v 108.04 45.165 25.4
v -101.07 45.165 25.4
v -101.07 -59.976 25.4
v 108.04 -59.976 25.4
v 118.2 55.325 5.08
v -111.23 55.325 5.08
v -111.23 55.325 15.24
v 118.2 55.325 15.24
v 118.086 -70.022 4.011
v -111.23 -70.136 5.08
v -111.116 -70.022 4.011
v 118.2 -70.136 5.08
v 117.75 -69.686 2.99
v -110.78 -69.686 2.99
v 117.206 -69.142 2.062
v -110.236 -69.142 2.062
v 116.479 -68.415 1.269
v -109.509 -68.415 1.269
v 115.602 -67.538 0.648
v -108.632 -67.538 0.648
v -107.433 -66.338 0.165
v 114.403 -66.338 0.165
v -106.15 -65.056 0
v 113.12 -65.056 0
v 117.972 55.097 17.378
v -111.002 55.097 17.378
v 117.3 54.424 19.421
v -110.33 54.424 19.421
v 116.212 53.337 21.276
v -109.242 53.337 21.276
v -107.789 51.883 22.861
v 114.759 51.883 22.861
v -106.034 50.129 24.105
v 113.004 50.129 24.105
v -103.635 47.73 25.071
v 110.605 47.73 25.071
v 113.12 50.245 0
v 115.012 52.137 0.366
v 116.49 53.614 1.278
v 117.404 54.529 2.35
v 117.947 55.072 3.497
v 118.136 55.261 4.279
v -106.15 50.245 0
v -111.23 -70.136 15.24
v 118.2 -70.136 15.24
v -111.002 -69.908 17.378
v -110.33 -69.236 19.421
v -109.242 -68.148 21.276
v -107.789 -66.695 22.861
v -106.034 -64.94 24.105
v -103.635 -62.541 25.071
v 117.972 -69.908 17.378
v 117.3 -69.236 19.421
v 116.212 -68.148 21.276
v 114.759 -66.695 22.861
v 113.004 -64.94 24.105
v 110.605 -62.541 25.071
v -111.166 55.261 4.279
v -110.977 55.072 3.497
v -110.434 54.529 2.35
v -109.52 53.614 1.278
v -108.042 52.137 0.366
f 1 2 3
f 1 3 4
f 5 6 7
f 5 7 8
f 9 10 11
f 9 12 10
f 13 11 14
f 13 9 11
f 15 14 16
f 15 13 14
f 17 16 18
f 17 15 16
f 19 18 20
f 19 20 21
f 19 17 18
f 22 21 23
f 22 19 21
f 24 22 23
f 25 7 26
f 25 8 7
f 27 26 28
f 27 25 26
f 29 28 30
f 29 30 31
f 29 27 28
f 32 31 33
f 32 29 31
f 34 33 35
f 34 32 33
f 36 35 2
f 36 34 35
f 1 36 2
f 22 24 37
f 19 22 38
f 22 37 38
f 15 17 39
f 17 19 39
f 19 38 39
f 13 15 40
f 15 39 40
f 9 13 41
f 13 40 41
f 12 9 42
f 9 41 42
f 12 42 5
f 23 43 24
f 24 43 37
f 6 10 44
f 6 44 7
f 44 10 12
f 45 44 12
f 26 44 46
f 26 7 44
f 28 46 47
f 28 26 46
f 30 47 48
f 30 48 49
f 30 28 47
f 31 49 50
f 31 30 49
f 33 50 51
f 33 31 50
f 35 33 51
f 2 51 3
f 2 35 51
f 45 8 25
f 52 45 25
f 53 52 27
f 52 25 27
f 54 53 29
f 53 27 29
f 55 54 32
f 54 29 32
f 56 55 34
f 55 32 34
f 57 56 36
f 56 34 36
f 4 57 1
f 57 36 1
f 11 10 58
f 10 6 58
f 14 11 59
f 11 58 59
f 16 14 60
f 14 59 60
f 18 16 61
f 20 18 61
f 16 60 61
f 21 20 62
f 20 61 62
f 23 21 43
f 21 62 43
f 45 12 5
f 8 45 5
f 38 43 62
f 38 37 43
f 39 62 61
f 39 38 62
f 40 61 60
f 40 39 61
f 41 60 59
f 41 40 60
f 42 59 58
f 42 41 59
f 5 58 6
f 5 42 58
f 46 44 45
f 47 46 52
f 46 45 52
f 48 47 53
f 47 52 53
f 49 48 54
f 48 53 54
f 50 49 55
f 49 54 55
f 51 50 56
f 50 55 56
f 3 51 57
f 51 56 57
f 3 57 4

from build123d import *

# Parameters (mm, degrees)
F0_W     = 229.429774
F0_H     = 125.460326
F1_DEPTH = 25.4
F2_R     = 10.16
F3_R     = 5.08


with BuildPart() as f1:
    # F0 (on Top) → F1 (new body)
    with BuildSketch(Plane.XY):
        with Locations((3.485013, -7.405646)):
            Rectangle(F0_W, F0_H)
    extrude(amount=F1_DEPTH)

    # F2
    f2_edges = [f1.edges().sort_by_distance(p)[0] for p in [
        (3.485013, 55.324517, 25.4),
        (-111.229874, -7.405646, 25.4),
        (3.485013, -70.135809, 25.4),
        (118.1999, -7.405646, 25.4),
    ]]
    fillet(f2_edges, radius=F2_R)

    # F3
    f3_edges = [f1.edges().sort_by_distance(p)[0] for p in [
        (3.485013, 55.324517, 0),
        (-111.229874, -7.405646, 0),
        (3.485013, -70.135809, 0),
        (118.1999, -7.405646, 0),
    ]]
    fillet(f3_edges, radius=F3_R)


solid = f1.part
